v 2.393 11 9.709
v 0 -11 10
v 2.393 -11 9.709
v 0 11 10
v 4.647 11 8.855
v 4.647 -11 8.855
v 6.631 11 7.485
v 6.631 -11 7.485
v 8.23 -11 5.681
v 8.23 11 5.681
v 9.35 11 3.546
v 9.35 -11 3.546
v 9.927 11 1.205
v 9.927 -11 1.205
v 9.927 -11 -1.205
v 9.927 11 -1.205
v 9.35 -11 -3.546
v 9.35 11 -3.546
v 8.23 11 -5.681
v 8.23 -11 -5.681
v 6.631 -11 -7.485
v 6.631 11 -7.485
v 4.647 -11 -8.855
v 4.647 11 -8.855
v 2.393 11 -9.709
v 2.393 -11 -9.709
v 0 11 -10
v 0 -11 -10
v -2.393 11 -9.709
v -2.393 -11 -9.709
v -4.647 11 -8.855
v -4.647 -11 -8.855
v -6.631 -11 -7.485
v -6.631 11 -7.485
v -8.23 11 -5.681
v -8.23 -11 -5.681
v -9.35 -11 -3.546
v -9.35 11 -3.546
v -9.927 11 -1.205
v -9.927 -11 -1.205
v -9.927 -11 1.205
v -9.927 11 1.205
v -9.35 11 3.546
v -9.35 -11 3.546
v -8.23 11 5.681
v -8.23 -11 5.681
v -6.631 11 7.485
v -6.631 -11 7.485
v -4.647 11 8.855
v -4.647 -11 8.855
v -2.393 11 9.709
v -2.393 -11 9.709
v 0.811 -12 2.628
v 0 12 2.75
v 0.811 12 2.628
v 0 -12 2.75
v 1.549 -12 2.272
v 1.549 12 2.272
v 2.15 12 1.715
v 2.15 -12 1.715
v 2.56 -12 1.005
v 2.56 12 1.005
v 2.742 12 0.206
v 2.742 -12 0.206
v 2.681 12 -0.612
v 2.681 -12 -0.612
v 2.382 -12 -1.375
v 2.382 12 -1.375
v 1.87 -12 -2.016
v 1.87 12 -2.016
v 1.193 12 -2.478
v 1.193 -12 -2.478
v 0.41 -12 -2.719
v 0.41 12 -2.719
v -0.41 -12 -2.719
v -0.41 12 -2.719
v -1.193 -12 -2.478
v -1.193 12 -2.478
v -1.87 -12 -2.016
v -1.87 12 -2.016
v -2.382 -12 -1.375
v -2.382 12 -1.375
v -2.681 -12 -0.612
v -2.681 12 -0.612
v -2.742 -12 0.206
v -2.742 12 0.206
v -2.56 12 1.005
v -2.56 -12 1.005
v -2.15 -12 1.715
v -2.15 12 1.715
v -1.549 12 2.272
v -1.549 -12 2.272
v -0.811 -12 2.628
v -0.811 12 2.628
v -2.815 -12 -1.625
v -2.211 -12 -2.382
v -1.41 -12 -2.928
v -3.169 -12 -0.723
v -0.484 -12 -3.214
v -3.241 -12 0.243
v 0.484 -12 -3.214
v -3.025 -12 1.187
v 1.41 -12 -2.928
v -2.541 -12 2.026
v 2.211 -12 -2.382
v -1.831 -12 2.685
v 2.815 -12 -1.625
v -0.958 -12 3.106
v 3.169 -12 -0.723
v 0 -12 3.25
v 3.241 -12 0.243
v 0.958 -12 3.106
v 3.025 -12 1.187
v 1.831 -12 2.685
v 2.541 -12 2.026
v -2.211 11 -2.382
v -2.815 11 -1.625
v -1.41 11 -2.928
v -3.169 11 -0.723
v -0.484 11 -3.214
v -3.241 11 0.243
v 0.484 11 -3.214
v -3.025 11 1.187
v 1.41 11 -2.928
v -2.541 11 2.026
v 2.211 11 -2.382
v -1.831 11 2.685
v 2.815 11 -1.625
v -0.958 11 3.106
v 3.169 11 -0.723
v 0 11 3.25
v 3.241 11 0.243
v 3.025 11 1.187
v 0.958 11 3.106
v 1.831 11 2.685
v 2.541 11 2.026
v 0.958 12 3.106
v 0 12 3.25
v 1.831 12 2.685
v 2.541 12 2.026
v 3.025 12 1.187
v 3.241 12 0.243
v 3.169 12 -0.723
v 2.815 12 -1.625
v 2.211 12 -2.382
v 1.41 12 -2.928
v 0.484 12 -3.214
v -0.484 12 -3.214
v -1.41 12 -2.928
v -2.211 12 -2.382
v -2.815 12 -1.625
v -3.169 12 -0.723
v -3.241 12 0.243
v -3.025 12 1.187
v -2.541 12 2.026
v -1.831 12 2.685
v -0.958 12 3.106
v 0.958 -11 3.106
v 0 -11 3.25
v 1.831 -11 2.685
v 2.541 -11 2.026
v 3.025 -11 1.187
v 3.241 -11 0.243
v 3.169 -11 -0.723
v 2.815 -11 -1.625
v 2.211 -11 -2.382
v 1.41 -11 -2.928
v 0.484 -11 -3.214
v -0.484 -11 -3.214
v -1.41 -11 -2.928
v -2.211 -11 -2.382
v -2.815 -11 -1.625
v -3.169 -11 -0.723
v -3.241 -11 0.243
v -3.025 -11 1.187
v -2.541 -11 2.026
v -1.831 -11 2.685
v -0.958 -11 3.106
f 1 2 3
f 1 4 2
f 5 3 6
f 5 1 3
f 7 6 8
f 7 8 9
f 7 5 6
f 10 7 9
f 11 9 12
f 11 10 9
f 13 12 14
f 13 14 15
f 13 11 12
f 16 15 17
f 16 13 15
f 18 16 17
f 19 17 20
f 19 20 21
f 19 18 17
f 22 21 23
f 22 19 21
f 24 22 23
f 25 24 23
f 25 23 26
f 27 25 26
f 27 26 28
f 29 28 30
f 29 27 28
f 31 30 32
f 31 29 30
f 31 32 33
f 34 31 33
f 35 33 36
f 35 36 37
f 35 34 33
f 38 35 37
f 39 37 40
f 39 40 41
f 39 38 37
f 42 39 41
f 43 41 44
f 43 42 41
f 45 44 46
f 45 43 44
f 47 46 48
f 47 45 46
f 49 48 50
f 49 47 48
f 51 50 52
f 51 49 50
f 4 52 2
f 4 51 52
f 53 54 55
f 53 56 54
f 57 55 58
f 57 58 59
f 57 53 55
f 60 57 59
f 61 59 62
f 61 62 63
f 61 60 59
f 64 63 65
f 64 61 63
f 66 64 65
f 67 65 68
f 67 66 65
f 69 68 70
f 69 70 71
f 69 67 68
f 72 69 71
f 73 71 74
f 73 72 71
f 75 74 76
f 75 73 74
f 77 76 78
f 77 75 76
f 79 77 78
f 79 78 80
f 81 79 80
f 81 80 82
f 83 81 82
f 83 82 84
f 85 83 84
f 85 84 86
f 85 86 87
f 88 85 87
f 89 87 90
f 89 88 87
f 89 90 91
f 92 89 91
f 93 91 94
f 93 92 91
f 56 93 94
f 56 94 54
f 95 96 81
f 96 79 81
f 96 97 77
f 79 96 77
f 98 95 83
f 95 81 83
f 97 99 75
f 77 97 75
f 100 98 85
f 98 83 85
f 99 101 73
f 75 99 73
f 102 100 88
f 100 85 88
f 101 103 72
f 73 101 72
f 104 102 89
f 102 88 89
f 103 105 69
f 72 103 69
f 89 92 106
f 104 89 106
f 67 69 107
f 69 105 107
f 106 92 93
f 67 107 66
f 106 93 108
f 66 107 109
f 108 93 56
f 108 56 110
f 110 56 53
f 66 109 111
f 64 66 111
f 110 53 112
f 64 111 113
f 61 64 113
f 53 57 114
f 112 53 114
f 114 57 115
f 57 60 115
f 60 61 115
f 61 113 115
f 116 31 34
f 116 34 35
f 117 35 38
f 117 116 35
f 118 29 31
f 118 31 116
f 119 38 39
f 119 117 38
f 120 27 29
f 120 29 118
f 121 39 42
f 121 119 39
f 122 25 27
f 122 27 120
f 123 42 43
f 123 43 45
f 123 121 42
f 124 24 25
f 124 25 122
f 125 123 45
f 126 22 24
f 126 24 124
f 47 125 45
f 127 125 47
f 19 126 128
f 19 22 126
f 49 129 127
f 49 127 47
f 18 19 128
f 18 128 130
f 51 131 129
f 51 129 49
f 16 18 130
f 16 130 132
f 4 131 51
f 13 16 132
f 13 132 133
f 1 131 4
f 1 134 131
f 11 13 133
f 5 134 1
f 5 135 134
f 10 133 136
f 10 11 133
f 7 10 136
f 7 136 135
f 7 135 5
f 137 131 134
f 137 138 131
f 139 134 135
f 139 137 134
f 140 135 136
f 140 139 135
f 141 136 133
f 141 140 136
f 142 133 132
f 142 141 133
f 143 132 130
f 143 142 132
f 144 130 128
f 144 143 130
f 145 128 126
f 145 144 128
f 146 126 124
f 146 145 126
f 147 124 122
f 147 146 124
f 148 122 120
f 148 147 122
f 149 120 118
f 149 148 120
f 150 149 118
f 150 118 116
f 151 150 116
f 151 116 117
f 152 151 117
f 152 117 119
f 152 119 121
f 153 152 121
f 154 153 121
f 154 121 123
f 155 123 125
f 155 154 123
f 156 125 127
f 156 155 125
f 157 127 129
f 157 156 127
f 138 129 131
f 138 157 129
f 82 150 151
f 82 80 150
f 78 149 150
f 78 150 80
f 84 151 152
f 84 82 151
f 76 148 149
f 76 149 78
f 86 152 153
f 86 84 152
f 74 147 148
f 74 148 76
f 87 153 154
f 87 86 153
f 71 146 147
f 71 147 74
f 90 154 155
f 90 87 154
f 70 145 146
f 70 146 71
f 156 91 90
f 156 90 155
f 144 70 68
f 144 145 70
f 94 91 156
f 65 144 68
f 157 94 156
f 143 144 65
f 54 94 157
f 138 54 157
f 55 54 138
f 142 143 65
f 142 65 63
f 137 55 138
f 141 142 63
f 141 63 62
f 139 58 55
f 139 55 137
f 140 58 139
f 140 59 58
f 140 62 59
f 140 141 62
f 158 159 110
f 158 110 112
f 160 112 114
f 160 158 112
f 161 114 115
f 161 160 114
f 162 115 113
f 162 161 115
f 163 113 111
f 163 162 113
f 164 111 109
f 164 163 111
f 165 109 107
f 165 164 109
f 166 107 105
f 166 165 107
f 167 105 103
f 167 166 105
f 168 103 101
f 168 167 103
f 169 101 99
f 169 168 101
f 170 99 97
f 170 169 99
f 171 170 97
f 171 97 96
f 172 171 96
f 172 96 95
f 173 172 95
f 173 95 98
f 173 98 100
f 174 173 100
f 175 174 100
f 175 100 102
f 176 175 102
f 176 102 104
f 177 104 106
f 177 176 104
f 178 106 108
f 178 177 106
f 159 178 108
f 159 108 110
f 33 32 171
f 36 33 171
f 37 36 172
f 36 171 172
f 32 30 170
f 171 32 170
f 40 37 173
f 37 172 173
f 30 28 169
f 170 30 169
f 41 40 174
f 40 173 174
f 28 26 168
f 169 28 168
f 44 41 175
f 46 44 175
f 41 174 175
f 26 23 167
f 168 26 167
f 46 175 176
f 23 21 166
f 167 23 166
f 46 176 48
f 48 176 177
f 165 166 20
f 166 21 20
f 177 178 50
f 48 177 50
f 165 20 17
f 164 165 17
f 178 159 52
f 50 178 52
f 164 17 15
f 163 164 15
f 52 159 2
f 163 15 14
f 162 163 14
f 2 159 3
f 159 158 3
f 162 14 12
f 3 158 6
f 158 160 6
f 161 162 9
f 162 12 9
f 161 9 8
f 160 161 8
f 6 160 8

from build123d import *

# Parameters (mm, degrees)
ESBO_O1_R                = 10
ESBO_O1_R_2              = 3.25
RESSALTO_EXTRUS_O1_DEPTH = 11
ESBO_O1_3_R              = 3.25
ESBO_O1_3_R_2            = 2.75
RESSALTO_EXTRUS_O2_DEPTH = 12


with BuildPart() as part:
    # Esboço1 → Ressalto-extrusão1 (new, symmetric)
    with BuildSketch(Plane(origin=(0, 0, 0), x_dir=(1, 0, 0), z_dir=(0, 1, 0))):
        Circle(ESBO_O1_R)
        Circle(ESBO_O1_R_2, mode=Mode.SUBTRACT)
    extrude(amount=RESSALTO_EXTRUS_O1_DEPTH, both=True)

    # Esboço1<3> → Ressalto-extrusão2 (add, symmetric)
    with BuildSketch(Plane(origin=(0, 0, 0), x_dir=(1, 0, 0), z_dir=(0, 1, 0))):
        Circle(ESBO_O1_3_R)
        Circle(ESBO_O1_3_R_2, mode=Mode.SUBTRACT)
    extrude(amount=RESSALTO_EXTRUS_O2_DEPTH, both=True)


solid = part.part
